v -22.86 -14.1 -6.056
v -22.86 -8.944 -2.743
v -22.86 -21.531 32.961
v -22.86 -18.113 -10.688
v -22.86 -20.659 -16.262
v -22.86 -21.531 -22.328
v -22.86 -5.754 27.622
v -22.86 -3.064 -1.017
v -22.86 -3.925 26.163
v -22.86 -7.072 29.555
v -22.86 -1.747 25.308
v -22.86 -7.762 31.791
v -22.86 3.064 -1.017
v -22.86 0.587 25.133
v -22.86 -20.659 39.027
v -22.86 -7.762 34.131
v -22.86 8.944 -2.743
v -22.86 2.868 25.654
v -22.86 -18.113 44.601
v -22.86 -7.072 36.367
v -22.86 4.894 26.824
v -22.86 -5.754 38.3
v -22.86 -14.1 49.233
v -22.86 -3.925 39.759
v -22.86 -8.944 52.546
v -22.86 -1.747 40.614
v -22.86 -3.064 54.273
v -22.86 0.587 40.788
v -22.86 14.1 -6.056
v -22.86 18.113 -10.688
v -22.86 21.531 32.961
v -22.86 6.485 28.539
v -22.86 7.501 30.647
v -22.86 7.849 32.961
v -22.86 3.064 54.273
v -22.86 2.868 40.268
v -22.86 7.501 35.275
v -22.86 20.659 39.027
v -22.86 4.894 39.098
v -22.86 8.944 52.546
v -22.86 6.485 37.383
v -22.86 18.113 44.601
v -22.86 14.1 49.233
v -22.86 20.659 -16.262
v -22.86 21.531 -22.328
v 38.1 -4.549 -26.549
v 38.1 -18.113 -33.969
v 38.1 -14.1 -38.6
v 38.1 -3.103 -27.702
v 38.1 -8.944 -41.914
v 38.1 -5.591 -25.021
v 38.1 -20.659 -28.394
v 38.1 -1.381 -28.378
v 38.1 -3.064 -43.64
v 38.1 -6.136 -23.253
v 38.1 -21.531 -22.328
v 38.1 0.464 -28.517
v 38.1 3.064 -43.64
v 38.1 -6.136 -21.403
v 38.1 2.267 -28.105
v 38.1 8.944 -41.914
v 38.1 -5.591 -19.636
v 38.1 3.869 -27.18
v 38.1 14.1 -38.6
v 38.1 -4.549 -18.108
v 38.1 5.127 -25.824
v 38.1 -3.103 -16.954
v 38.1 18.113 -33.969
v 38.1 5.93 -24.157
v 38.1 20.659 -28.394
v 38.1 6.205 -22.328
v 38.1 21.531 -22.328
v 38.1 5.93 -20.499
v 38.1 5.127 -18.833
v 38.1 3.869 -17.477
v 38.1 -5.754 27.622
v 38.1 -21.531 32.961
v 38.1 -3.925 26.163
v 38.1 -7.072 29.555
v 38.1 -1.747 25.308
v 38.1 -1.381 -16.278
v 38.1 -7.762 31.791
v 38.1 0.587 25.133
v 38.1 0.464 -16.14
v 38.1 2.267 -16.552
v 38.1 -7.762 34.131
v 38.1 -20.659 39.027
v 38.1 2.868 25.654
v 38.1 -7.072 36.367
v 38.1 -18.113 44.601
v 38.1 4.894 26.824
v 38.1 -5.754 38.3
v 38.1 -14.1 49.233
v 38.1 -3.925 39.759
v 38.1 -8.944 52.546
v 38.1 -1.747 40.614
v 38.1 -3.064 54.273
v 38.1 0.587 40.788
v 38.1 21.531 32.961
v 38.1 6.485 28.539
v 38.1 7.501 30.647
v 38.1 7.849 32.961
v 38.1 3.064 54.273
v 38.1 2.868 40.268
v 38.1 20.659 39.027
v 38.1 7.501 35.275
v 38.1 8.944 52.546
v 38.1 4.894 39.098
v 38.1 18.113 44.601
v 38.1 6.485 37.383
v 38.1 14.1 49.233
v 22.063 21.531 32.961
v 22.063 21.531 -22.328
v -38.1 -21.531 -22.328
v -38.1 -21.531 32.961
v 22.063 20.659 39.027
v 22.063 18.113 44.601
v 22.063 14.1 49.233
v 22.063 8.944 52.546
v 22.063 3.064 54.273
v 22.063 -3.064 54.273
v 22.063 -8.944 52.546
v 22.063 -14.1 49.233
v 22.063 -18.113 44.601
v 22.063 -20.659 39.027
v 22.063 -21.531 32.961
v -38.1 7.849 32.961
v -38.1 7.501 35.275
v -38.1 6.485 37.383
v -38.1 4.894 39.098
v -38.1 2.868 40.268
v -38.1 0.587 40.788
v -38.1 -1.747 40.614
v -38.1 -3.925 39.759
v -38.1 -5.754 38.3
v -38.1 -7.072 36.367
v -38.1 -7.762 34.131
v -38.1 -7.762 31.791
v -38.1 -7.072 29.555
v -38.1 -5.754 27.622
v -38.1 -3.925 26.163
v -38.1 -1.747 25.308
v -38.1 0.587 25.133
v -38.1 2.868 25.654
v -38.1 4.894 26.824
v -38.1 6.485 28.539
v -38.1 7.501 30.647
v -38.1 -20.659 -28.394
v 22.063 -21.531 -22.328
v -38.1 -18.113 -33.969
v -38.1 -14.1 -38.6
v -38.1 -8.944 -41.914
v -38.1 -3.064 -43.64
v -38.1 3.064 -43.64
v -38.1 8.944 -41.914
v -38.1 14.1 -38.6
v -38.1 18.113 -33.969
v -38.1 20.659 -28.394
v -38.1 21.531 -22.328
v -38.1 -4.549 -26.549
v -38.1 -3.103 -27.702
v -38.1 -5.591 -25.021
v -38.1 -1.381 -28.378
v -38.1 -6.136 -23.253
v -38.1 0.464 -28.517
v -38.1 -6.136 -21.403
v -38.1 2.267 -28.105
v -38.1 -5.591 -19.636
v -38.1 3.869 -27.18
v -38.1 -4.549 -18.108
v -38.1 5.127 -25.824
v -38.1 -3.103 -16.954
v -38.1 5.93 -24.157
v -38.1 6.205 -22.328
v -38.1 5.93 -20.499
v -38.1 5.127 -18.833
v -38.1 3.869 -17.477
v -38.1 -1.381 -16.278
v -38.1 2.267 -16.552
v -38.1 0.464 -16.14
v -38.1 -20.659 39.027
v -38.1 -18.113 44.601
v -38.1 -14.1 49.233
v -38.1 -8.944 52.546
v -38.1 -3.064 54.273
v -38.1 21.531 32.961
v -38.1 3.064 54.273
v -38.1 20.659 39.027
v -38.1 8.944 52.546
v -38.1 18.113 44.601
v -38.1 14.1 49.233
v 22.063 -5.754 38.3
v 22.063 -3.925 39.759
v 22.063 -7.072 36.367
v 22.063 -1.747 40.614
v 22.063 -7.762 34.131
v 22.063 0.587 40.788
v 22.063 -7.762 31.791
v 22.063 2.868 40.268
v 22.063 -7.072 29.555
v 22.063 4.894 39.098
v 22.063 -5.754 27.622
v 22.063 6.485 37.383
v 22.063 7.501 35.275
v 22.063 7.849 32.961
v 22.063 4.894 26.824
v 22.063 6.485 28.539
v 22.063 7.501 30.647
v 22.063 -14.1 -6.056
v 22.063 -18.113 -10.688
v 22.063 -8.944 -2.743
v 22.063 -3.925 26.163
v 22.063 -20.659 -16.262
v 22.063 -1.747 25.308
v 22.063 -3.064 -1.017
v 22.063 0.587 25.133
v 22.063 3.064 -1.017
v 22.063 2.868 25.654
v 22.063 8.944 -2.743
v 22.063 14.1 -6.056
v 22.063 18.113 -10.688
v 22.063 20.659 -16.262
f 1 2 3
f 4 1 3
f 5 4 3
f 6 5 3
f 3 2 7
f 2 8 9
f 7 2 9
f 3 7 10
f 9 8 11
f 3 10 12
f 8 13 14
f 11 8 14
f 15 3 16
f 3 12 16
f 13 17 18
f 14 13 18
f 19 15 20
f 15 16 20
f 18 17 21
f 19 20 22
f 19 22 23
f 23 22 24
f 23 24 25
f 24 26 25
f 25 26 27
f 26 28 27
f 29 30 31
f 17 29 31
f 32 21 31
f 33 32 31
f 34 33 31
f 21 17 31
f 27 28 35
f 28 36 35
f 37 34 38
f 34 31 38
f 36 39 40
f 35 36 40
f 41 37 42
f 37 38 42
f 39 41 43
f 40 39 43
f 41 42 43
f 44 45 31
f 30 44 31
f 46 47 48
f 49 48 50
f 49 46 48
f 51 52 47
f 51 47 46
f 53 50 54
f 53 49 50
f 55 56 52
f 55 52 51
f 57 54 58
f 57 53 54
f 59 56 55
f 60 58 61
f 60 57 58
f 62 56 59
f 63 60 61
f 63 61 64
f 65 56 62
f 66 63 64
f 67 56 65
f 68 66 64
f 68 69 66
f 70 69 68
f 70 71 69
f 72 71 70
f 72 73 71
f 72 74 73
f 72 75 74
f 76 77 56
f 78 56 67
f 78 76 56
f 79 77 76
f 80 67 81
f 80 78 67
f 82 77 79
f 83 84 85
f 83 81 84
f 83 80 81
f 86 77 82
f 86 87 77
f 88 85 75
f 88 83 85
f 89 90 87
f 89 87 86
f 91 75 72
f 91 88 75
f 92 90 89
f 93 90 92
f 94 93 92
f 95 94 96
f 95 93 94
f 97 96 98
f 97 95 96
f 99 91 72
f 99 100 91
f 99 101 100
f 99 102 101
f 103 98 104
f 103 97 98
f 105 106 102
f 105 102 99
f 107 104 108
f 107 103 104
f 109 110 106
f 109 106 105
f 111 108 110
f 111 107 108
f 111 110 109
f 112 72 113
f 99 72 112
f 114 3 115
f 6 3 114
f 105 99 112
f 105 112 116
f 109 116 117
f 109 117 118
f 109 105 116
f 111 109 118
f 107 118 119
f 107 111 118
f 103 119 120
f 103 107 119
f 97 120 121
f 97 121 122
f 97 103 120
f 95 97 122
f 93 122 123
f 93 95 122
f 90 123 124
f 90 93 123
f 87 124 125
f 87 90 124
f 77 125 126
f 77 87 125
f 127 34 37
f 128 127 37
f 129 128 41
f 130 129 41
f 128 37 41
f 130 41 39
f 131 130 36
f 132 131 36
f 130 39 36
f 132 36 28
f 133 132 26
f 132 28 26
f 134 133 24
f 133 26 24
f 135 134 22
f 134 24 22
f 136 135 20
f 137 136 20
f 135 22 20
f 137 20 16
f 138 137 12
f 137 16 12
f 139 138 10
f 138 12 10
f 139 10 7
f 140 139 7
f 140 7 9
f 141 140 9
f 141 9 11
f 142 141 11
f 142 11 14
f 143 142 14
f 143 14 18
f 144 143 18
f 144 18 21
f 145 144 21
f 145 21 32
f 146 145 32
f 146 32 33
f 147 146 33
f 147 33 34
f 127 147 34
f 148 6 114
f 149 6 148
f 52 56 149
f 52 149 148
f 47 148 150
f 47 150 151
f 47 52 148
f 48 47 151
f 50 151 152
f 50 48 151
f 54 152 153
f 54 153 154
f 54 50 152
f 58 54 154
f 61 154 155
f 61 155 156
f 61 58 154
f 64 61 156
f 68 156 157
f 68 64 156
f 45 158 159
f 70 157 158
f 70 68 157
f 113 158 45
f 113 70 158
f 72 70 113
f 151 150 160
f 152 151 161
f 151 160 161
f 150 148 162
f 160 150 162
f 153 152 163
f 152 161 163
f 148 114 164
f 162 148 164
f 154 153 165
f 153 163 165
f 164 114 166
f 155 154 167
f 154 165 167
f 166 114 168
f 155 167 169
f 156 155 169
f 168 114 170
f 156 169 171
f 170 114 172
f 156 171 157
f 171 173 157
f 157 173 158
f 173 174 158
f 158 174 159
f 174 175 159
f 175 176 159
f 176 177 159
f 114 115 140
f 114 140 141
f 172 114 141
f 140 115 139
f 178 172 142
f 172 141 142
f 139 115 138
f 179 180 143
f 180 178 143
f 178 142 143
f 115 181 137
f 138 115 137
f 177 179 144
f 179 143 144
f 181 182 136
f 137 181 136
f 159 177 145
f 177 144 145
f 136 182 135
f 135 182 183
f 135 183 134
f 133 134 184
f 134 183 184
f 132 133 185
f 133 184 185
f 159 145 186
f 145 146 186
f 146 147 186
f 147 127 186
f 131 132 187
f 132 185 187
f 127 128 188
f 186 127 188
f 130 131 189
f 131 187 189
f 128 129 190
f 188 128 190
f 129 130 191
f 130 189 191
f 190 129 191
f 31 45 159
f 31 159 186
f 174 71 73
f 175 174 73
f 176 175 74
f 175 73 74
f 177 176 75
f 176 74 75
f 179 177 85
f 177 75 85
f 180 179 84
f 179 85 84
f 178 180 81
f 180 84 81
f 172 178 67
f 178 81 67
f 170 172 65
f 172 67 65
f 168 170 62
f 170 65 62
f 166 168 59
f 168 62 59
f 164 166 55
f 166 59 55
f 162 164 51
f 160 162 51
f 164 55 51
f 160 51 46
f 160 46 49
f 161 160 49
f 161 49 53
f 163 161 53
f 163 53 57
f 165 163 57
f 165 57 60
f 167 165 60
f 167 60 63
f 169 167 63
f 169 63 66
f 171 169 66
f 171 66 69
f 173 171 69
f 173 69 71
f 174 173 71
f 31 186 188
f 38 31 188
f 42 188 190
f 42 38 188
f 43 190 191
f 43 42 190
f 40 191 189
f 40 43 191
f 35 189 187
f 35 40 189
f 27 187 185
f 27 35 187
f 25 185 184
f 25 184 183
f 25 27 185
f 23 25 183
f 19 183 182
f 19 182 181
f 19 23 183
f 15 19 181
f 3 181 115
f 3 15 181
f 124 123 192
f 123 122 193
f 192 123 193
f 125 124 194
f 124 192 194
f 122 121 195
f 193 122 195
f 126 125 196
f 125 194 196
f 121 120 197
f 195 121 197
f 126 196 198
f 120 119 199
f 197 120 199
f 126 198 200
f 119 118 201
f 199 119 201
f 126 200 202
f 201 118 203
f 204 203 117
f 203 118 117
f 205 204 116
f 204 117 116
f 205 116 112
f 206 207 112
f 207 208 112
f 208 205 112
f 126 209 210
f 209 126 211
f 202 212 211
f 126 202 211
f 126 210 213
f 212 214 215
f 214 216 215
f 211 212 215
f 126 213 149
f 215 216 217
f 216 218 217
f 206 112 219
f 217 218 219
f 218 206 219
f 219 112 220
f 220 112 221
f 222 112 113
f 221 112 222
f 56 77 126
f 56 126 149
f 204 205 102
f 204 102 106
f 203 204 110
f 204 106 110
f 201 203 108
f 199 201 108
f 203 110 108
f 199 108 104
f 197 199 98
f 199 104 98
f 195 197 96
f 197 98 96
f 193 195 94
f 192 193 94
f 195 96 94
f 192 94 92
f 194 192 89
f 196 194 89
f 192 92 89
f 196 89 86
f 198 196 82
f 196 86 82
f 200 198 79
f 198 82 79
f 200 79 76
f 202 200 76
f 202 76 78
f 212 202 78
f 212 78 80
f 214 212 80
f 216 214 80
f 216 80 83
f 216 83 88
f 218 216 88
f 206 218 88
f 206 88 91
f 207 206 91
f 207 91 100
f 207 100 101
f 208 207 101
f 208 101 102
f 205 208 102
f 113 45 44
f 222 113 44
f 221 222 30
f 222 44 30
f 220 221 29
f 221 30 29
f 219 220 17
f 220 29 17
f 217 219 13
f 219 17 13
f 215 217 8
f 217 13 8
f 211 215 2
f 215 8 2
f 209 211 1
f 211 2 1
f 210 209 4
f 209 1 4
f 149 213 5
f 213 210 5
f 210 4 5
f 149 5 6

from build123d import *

# Parameters (mm, degrees)
F1_DEPTH      = 38.1
F1_DEPTH_BACK = 38.1
F2_R          = 7.8493938986
F2_R_2        = 6.2054902318
F3_DEPTH      = 76.201
F4_W          = 44.9225585908
F4_H          = 36.150701344
F4_H_2        = 55.2893020213
F5_DEPTH      = 43.0628599057
F6_R          = 6.2054902318
F7_DEPTH      = 60.95999991


with BuildPart() as f1:
    # F0 (on Right) → F1 (new body, two sides)
    with BuildSketch(Plane.YZ) as f1_sk:
        with BuildLine():
            Line((-21.5309299529, 32.9609289765), (-21.5309299529, -22.3283730447))
            ThreePointArc((-21.5309299529, -22.3283730447), (0, -43.8593029976), (21.5309299529, -22.3283730447))
            Line((21.5309299529, -22.3283730447), (21.5309299529, 32.9609289765))
            ThreePointArc((21.5309299529, 32.9609289765), (0, 54.4918589294), (-21.5309299529, 32.9609289765))
        make_face()
    extrude(amount=F1_DEPTH)
    extrude(f1_sk.sketch, amount=-F1_DEPTH_BACK)

    # F2 (on face) → F3 (cut, through all)
    with BuildSketch(Plane.YZ.offset(38.1)):
        with Locations((0, 32.9609289765)):
            Circle(F2_R)
        with Locations((0, -22.3283730447)):
            Circle(F2_R_2)
    extrude(amount=-F3_DEPTH, mode=Mode.SUBTRACT)

    # F4 (on face) → F5 (cut, through all)
    with BuildSketch(Plane(origin=(0, 21.5309299529, 0), x_dir=(-1, 0, 0), z_dir=(0, 1, 0))):
        with Locations((0.3987206146, 51.0362796485)):
            Rectangle(F4_W, F4_H)
        with Locations((0.3987206146, 5.3162779659)):
            Rectangle(F4_W, F4_H_2)
    extrude(amount=-F5_DEPTH, mode=Mode.SUBTRACT)

    # F6 (on face) → F7 (join, through all)
    with BuildSketch(Plane.YZ.offset(-22.85999991)):
        with BuildLine():
            ThreePointArc((21.5309299529, -22.3283730447), (0, -0.7974430919), (-21.5309299529, -22.3283730447))
            ThreePointArc((-21.5309299529, -22.3283730447), (0, -43.8593029976), (21.5309299529, -22.3283730447))
        make_face()
        with Locations((0, -22.3283730447)):
            Circle(F6_R, mode=Mode.SUBTRACT)
    extrude(amount=F7_DEPTH)


solid = f1.part
